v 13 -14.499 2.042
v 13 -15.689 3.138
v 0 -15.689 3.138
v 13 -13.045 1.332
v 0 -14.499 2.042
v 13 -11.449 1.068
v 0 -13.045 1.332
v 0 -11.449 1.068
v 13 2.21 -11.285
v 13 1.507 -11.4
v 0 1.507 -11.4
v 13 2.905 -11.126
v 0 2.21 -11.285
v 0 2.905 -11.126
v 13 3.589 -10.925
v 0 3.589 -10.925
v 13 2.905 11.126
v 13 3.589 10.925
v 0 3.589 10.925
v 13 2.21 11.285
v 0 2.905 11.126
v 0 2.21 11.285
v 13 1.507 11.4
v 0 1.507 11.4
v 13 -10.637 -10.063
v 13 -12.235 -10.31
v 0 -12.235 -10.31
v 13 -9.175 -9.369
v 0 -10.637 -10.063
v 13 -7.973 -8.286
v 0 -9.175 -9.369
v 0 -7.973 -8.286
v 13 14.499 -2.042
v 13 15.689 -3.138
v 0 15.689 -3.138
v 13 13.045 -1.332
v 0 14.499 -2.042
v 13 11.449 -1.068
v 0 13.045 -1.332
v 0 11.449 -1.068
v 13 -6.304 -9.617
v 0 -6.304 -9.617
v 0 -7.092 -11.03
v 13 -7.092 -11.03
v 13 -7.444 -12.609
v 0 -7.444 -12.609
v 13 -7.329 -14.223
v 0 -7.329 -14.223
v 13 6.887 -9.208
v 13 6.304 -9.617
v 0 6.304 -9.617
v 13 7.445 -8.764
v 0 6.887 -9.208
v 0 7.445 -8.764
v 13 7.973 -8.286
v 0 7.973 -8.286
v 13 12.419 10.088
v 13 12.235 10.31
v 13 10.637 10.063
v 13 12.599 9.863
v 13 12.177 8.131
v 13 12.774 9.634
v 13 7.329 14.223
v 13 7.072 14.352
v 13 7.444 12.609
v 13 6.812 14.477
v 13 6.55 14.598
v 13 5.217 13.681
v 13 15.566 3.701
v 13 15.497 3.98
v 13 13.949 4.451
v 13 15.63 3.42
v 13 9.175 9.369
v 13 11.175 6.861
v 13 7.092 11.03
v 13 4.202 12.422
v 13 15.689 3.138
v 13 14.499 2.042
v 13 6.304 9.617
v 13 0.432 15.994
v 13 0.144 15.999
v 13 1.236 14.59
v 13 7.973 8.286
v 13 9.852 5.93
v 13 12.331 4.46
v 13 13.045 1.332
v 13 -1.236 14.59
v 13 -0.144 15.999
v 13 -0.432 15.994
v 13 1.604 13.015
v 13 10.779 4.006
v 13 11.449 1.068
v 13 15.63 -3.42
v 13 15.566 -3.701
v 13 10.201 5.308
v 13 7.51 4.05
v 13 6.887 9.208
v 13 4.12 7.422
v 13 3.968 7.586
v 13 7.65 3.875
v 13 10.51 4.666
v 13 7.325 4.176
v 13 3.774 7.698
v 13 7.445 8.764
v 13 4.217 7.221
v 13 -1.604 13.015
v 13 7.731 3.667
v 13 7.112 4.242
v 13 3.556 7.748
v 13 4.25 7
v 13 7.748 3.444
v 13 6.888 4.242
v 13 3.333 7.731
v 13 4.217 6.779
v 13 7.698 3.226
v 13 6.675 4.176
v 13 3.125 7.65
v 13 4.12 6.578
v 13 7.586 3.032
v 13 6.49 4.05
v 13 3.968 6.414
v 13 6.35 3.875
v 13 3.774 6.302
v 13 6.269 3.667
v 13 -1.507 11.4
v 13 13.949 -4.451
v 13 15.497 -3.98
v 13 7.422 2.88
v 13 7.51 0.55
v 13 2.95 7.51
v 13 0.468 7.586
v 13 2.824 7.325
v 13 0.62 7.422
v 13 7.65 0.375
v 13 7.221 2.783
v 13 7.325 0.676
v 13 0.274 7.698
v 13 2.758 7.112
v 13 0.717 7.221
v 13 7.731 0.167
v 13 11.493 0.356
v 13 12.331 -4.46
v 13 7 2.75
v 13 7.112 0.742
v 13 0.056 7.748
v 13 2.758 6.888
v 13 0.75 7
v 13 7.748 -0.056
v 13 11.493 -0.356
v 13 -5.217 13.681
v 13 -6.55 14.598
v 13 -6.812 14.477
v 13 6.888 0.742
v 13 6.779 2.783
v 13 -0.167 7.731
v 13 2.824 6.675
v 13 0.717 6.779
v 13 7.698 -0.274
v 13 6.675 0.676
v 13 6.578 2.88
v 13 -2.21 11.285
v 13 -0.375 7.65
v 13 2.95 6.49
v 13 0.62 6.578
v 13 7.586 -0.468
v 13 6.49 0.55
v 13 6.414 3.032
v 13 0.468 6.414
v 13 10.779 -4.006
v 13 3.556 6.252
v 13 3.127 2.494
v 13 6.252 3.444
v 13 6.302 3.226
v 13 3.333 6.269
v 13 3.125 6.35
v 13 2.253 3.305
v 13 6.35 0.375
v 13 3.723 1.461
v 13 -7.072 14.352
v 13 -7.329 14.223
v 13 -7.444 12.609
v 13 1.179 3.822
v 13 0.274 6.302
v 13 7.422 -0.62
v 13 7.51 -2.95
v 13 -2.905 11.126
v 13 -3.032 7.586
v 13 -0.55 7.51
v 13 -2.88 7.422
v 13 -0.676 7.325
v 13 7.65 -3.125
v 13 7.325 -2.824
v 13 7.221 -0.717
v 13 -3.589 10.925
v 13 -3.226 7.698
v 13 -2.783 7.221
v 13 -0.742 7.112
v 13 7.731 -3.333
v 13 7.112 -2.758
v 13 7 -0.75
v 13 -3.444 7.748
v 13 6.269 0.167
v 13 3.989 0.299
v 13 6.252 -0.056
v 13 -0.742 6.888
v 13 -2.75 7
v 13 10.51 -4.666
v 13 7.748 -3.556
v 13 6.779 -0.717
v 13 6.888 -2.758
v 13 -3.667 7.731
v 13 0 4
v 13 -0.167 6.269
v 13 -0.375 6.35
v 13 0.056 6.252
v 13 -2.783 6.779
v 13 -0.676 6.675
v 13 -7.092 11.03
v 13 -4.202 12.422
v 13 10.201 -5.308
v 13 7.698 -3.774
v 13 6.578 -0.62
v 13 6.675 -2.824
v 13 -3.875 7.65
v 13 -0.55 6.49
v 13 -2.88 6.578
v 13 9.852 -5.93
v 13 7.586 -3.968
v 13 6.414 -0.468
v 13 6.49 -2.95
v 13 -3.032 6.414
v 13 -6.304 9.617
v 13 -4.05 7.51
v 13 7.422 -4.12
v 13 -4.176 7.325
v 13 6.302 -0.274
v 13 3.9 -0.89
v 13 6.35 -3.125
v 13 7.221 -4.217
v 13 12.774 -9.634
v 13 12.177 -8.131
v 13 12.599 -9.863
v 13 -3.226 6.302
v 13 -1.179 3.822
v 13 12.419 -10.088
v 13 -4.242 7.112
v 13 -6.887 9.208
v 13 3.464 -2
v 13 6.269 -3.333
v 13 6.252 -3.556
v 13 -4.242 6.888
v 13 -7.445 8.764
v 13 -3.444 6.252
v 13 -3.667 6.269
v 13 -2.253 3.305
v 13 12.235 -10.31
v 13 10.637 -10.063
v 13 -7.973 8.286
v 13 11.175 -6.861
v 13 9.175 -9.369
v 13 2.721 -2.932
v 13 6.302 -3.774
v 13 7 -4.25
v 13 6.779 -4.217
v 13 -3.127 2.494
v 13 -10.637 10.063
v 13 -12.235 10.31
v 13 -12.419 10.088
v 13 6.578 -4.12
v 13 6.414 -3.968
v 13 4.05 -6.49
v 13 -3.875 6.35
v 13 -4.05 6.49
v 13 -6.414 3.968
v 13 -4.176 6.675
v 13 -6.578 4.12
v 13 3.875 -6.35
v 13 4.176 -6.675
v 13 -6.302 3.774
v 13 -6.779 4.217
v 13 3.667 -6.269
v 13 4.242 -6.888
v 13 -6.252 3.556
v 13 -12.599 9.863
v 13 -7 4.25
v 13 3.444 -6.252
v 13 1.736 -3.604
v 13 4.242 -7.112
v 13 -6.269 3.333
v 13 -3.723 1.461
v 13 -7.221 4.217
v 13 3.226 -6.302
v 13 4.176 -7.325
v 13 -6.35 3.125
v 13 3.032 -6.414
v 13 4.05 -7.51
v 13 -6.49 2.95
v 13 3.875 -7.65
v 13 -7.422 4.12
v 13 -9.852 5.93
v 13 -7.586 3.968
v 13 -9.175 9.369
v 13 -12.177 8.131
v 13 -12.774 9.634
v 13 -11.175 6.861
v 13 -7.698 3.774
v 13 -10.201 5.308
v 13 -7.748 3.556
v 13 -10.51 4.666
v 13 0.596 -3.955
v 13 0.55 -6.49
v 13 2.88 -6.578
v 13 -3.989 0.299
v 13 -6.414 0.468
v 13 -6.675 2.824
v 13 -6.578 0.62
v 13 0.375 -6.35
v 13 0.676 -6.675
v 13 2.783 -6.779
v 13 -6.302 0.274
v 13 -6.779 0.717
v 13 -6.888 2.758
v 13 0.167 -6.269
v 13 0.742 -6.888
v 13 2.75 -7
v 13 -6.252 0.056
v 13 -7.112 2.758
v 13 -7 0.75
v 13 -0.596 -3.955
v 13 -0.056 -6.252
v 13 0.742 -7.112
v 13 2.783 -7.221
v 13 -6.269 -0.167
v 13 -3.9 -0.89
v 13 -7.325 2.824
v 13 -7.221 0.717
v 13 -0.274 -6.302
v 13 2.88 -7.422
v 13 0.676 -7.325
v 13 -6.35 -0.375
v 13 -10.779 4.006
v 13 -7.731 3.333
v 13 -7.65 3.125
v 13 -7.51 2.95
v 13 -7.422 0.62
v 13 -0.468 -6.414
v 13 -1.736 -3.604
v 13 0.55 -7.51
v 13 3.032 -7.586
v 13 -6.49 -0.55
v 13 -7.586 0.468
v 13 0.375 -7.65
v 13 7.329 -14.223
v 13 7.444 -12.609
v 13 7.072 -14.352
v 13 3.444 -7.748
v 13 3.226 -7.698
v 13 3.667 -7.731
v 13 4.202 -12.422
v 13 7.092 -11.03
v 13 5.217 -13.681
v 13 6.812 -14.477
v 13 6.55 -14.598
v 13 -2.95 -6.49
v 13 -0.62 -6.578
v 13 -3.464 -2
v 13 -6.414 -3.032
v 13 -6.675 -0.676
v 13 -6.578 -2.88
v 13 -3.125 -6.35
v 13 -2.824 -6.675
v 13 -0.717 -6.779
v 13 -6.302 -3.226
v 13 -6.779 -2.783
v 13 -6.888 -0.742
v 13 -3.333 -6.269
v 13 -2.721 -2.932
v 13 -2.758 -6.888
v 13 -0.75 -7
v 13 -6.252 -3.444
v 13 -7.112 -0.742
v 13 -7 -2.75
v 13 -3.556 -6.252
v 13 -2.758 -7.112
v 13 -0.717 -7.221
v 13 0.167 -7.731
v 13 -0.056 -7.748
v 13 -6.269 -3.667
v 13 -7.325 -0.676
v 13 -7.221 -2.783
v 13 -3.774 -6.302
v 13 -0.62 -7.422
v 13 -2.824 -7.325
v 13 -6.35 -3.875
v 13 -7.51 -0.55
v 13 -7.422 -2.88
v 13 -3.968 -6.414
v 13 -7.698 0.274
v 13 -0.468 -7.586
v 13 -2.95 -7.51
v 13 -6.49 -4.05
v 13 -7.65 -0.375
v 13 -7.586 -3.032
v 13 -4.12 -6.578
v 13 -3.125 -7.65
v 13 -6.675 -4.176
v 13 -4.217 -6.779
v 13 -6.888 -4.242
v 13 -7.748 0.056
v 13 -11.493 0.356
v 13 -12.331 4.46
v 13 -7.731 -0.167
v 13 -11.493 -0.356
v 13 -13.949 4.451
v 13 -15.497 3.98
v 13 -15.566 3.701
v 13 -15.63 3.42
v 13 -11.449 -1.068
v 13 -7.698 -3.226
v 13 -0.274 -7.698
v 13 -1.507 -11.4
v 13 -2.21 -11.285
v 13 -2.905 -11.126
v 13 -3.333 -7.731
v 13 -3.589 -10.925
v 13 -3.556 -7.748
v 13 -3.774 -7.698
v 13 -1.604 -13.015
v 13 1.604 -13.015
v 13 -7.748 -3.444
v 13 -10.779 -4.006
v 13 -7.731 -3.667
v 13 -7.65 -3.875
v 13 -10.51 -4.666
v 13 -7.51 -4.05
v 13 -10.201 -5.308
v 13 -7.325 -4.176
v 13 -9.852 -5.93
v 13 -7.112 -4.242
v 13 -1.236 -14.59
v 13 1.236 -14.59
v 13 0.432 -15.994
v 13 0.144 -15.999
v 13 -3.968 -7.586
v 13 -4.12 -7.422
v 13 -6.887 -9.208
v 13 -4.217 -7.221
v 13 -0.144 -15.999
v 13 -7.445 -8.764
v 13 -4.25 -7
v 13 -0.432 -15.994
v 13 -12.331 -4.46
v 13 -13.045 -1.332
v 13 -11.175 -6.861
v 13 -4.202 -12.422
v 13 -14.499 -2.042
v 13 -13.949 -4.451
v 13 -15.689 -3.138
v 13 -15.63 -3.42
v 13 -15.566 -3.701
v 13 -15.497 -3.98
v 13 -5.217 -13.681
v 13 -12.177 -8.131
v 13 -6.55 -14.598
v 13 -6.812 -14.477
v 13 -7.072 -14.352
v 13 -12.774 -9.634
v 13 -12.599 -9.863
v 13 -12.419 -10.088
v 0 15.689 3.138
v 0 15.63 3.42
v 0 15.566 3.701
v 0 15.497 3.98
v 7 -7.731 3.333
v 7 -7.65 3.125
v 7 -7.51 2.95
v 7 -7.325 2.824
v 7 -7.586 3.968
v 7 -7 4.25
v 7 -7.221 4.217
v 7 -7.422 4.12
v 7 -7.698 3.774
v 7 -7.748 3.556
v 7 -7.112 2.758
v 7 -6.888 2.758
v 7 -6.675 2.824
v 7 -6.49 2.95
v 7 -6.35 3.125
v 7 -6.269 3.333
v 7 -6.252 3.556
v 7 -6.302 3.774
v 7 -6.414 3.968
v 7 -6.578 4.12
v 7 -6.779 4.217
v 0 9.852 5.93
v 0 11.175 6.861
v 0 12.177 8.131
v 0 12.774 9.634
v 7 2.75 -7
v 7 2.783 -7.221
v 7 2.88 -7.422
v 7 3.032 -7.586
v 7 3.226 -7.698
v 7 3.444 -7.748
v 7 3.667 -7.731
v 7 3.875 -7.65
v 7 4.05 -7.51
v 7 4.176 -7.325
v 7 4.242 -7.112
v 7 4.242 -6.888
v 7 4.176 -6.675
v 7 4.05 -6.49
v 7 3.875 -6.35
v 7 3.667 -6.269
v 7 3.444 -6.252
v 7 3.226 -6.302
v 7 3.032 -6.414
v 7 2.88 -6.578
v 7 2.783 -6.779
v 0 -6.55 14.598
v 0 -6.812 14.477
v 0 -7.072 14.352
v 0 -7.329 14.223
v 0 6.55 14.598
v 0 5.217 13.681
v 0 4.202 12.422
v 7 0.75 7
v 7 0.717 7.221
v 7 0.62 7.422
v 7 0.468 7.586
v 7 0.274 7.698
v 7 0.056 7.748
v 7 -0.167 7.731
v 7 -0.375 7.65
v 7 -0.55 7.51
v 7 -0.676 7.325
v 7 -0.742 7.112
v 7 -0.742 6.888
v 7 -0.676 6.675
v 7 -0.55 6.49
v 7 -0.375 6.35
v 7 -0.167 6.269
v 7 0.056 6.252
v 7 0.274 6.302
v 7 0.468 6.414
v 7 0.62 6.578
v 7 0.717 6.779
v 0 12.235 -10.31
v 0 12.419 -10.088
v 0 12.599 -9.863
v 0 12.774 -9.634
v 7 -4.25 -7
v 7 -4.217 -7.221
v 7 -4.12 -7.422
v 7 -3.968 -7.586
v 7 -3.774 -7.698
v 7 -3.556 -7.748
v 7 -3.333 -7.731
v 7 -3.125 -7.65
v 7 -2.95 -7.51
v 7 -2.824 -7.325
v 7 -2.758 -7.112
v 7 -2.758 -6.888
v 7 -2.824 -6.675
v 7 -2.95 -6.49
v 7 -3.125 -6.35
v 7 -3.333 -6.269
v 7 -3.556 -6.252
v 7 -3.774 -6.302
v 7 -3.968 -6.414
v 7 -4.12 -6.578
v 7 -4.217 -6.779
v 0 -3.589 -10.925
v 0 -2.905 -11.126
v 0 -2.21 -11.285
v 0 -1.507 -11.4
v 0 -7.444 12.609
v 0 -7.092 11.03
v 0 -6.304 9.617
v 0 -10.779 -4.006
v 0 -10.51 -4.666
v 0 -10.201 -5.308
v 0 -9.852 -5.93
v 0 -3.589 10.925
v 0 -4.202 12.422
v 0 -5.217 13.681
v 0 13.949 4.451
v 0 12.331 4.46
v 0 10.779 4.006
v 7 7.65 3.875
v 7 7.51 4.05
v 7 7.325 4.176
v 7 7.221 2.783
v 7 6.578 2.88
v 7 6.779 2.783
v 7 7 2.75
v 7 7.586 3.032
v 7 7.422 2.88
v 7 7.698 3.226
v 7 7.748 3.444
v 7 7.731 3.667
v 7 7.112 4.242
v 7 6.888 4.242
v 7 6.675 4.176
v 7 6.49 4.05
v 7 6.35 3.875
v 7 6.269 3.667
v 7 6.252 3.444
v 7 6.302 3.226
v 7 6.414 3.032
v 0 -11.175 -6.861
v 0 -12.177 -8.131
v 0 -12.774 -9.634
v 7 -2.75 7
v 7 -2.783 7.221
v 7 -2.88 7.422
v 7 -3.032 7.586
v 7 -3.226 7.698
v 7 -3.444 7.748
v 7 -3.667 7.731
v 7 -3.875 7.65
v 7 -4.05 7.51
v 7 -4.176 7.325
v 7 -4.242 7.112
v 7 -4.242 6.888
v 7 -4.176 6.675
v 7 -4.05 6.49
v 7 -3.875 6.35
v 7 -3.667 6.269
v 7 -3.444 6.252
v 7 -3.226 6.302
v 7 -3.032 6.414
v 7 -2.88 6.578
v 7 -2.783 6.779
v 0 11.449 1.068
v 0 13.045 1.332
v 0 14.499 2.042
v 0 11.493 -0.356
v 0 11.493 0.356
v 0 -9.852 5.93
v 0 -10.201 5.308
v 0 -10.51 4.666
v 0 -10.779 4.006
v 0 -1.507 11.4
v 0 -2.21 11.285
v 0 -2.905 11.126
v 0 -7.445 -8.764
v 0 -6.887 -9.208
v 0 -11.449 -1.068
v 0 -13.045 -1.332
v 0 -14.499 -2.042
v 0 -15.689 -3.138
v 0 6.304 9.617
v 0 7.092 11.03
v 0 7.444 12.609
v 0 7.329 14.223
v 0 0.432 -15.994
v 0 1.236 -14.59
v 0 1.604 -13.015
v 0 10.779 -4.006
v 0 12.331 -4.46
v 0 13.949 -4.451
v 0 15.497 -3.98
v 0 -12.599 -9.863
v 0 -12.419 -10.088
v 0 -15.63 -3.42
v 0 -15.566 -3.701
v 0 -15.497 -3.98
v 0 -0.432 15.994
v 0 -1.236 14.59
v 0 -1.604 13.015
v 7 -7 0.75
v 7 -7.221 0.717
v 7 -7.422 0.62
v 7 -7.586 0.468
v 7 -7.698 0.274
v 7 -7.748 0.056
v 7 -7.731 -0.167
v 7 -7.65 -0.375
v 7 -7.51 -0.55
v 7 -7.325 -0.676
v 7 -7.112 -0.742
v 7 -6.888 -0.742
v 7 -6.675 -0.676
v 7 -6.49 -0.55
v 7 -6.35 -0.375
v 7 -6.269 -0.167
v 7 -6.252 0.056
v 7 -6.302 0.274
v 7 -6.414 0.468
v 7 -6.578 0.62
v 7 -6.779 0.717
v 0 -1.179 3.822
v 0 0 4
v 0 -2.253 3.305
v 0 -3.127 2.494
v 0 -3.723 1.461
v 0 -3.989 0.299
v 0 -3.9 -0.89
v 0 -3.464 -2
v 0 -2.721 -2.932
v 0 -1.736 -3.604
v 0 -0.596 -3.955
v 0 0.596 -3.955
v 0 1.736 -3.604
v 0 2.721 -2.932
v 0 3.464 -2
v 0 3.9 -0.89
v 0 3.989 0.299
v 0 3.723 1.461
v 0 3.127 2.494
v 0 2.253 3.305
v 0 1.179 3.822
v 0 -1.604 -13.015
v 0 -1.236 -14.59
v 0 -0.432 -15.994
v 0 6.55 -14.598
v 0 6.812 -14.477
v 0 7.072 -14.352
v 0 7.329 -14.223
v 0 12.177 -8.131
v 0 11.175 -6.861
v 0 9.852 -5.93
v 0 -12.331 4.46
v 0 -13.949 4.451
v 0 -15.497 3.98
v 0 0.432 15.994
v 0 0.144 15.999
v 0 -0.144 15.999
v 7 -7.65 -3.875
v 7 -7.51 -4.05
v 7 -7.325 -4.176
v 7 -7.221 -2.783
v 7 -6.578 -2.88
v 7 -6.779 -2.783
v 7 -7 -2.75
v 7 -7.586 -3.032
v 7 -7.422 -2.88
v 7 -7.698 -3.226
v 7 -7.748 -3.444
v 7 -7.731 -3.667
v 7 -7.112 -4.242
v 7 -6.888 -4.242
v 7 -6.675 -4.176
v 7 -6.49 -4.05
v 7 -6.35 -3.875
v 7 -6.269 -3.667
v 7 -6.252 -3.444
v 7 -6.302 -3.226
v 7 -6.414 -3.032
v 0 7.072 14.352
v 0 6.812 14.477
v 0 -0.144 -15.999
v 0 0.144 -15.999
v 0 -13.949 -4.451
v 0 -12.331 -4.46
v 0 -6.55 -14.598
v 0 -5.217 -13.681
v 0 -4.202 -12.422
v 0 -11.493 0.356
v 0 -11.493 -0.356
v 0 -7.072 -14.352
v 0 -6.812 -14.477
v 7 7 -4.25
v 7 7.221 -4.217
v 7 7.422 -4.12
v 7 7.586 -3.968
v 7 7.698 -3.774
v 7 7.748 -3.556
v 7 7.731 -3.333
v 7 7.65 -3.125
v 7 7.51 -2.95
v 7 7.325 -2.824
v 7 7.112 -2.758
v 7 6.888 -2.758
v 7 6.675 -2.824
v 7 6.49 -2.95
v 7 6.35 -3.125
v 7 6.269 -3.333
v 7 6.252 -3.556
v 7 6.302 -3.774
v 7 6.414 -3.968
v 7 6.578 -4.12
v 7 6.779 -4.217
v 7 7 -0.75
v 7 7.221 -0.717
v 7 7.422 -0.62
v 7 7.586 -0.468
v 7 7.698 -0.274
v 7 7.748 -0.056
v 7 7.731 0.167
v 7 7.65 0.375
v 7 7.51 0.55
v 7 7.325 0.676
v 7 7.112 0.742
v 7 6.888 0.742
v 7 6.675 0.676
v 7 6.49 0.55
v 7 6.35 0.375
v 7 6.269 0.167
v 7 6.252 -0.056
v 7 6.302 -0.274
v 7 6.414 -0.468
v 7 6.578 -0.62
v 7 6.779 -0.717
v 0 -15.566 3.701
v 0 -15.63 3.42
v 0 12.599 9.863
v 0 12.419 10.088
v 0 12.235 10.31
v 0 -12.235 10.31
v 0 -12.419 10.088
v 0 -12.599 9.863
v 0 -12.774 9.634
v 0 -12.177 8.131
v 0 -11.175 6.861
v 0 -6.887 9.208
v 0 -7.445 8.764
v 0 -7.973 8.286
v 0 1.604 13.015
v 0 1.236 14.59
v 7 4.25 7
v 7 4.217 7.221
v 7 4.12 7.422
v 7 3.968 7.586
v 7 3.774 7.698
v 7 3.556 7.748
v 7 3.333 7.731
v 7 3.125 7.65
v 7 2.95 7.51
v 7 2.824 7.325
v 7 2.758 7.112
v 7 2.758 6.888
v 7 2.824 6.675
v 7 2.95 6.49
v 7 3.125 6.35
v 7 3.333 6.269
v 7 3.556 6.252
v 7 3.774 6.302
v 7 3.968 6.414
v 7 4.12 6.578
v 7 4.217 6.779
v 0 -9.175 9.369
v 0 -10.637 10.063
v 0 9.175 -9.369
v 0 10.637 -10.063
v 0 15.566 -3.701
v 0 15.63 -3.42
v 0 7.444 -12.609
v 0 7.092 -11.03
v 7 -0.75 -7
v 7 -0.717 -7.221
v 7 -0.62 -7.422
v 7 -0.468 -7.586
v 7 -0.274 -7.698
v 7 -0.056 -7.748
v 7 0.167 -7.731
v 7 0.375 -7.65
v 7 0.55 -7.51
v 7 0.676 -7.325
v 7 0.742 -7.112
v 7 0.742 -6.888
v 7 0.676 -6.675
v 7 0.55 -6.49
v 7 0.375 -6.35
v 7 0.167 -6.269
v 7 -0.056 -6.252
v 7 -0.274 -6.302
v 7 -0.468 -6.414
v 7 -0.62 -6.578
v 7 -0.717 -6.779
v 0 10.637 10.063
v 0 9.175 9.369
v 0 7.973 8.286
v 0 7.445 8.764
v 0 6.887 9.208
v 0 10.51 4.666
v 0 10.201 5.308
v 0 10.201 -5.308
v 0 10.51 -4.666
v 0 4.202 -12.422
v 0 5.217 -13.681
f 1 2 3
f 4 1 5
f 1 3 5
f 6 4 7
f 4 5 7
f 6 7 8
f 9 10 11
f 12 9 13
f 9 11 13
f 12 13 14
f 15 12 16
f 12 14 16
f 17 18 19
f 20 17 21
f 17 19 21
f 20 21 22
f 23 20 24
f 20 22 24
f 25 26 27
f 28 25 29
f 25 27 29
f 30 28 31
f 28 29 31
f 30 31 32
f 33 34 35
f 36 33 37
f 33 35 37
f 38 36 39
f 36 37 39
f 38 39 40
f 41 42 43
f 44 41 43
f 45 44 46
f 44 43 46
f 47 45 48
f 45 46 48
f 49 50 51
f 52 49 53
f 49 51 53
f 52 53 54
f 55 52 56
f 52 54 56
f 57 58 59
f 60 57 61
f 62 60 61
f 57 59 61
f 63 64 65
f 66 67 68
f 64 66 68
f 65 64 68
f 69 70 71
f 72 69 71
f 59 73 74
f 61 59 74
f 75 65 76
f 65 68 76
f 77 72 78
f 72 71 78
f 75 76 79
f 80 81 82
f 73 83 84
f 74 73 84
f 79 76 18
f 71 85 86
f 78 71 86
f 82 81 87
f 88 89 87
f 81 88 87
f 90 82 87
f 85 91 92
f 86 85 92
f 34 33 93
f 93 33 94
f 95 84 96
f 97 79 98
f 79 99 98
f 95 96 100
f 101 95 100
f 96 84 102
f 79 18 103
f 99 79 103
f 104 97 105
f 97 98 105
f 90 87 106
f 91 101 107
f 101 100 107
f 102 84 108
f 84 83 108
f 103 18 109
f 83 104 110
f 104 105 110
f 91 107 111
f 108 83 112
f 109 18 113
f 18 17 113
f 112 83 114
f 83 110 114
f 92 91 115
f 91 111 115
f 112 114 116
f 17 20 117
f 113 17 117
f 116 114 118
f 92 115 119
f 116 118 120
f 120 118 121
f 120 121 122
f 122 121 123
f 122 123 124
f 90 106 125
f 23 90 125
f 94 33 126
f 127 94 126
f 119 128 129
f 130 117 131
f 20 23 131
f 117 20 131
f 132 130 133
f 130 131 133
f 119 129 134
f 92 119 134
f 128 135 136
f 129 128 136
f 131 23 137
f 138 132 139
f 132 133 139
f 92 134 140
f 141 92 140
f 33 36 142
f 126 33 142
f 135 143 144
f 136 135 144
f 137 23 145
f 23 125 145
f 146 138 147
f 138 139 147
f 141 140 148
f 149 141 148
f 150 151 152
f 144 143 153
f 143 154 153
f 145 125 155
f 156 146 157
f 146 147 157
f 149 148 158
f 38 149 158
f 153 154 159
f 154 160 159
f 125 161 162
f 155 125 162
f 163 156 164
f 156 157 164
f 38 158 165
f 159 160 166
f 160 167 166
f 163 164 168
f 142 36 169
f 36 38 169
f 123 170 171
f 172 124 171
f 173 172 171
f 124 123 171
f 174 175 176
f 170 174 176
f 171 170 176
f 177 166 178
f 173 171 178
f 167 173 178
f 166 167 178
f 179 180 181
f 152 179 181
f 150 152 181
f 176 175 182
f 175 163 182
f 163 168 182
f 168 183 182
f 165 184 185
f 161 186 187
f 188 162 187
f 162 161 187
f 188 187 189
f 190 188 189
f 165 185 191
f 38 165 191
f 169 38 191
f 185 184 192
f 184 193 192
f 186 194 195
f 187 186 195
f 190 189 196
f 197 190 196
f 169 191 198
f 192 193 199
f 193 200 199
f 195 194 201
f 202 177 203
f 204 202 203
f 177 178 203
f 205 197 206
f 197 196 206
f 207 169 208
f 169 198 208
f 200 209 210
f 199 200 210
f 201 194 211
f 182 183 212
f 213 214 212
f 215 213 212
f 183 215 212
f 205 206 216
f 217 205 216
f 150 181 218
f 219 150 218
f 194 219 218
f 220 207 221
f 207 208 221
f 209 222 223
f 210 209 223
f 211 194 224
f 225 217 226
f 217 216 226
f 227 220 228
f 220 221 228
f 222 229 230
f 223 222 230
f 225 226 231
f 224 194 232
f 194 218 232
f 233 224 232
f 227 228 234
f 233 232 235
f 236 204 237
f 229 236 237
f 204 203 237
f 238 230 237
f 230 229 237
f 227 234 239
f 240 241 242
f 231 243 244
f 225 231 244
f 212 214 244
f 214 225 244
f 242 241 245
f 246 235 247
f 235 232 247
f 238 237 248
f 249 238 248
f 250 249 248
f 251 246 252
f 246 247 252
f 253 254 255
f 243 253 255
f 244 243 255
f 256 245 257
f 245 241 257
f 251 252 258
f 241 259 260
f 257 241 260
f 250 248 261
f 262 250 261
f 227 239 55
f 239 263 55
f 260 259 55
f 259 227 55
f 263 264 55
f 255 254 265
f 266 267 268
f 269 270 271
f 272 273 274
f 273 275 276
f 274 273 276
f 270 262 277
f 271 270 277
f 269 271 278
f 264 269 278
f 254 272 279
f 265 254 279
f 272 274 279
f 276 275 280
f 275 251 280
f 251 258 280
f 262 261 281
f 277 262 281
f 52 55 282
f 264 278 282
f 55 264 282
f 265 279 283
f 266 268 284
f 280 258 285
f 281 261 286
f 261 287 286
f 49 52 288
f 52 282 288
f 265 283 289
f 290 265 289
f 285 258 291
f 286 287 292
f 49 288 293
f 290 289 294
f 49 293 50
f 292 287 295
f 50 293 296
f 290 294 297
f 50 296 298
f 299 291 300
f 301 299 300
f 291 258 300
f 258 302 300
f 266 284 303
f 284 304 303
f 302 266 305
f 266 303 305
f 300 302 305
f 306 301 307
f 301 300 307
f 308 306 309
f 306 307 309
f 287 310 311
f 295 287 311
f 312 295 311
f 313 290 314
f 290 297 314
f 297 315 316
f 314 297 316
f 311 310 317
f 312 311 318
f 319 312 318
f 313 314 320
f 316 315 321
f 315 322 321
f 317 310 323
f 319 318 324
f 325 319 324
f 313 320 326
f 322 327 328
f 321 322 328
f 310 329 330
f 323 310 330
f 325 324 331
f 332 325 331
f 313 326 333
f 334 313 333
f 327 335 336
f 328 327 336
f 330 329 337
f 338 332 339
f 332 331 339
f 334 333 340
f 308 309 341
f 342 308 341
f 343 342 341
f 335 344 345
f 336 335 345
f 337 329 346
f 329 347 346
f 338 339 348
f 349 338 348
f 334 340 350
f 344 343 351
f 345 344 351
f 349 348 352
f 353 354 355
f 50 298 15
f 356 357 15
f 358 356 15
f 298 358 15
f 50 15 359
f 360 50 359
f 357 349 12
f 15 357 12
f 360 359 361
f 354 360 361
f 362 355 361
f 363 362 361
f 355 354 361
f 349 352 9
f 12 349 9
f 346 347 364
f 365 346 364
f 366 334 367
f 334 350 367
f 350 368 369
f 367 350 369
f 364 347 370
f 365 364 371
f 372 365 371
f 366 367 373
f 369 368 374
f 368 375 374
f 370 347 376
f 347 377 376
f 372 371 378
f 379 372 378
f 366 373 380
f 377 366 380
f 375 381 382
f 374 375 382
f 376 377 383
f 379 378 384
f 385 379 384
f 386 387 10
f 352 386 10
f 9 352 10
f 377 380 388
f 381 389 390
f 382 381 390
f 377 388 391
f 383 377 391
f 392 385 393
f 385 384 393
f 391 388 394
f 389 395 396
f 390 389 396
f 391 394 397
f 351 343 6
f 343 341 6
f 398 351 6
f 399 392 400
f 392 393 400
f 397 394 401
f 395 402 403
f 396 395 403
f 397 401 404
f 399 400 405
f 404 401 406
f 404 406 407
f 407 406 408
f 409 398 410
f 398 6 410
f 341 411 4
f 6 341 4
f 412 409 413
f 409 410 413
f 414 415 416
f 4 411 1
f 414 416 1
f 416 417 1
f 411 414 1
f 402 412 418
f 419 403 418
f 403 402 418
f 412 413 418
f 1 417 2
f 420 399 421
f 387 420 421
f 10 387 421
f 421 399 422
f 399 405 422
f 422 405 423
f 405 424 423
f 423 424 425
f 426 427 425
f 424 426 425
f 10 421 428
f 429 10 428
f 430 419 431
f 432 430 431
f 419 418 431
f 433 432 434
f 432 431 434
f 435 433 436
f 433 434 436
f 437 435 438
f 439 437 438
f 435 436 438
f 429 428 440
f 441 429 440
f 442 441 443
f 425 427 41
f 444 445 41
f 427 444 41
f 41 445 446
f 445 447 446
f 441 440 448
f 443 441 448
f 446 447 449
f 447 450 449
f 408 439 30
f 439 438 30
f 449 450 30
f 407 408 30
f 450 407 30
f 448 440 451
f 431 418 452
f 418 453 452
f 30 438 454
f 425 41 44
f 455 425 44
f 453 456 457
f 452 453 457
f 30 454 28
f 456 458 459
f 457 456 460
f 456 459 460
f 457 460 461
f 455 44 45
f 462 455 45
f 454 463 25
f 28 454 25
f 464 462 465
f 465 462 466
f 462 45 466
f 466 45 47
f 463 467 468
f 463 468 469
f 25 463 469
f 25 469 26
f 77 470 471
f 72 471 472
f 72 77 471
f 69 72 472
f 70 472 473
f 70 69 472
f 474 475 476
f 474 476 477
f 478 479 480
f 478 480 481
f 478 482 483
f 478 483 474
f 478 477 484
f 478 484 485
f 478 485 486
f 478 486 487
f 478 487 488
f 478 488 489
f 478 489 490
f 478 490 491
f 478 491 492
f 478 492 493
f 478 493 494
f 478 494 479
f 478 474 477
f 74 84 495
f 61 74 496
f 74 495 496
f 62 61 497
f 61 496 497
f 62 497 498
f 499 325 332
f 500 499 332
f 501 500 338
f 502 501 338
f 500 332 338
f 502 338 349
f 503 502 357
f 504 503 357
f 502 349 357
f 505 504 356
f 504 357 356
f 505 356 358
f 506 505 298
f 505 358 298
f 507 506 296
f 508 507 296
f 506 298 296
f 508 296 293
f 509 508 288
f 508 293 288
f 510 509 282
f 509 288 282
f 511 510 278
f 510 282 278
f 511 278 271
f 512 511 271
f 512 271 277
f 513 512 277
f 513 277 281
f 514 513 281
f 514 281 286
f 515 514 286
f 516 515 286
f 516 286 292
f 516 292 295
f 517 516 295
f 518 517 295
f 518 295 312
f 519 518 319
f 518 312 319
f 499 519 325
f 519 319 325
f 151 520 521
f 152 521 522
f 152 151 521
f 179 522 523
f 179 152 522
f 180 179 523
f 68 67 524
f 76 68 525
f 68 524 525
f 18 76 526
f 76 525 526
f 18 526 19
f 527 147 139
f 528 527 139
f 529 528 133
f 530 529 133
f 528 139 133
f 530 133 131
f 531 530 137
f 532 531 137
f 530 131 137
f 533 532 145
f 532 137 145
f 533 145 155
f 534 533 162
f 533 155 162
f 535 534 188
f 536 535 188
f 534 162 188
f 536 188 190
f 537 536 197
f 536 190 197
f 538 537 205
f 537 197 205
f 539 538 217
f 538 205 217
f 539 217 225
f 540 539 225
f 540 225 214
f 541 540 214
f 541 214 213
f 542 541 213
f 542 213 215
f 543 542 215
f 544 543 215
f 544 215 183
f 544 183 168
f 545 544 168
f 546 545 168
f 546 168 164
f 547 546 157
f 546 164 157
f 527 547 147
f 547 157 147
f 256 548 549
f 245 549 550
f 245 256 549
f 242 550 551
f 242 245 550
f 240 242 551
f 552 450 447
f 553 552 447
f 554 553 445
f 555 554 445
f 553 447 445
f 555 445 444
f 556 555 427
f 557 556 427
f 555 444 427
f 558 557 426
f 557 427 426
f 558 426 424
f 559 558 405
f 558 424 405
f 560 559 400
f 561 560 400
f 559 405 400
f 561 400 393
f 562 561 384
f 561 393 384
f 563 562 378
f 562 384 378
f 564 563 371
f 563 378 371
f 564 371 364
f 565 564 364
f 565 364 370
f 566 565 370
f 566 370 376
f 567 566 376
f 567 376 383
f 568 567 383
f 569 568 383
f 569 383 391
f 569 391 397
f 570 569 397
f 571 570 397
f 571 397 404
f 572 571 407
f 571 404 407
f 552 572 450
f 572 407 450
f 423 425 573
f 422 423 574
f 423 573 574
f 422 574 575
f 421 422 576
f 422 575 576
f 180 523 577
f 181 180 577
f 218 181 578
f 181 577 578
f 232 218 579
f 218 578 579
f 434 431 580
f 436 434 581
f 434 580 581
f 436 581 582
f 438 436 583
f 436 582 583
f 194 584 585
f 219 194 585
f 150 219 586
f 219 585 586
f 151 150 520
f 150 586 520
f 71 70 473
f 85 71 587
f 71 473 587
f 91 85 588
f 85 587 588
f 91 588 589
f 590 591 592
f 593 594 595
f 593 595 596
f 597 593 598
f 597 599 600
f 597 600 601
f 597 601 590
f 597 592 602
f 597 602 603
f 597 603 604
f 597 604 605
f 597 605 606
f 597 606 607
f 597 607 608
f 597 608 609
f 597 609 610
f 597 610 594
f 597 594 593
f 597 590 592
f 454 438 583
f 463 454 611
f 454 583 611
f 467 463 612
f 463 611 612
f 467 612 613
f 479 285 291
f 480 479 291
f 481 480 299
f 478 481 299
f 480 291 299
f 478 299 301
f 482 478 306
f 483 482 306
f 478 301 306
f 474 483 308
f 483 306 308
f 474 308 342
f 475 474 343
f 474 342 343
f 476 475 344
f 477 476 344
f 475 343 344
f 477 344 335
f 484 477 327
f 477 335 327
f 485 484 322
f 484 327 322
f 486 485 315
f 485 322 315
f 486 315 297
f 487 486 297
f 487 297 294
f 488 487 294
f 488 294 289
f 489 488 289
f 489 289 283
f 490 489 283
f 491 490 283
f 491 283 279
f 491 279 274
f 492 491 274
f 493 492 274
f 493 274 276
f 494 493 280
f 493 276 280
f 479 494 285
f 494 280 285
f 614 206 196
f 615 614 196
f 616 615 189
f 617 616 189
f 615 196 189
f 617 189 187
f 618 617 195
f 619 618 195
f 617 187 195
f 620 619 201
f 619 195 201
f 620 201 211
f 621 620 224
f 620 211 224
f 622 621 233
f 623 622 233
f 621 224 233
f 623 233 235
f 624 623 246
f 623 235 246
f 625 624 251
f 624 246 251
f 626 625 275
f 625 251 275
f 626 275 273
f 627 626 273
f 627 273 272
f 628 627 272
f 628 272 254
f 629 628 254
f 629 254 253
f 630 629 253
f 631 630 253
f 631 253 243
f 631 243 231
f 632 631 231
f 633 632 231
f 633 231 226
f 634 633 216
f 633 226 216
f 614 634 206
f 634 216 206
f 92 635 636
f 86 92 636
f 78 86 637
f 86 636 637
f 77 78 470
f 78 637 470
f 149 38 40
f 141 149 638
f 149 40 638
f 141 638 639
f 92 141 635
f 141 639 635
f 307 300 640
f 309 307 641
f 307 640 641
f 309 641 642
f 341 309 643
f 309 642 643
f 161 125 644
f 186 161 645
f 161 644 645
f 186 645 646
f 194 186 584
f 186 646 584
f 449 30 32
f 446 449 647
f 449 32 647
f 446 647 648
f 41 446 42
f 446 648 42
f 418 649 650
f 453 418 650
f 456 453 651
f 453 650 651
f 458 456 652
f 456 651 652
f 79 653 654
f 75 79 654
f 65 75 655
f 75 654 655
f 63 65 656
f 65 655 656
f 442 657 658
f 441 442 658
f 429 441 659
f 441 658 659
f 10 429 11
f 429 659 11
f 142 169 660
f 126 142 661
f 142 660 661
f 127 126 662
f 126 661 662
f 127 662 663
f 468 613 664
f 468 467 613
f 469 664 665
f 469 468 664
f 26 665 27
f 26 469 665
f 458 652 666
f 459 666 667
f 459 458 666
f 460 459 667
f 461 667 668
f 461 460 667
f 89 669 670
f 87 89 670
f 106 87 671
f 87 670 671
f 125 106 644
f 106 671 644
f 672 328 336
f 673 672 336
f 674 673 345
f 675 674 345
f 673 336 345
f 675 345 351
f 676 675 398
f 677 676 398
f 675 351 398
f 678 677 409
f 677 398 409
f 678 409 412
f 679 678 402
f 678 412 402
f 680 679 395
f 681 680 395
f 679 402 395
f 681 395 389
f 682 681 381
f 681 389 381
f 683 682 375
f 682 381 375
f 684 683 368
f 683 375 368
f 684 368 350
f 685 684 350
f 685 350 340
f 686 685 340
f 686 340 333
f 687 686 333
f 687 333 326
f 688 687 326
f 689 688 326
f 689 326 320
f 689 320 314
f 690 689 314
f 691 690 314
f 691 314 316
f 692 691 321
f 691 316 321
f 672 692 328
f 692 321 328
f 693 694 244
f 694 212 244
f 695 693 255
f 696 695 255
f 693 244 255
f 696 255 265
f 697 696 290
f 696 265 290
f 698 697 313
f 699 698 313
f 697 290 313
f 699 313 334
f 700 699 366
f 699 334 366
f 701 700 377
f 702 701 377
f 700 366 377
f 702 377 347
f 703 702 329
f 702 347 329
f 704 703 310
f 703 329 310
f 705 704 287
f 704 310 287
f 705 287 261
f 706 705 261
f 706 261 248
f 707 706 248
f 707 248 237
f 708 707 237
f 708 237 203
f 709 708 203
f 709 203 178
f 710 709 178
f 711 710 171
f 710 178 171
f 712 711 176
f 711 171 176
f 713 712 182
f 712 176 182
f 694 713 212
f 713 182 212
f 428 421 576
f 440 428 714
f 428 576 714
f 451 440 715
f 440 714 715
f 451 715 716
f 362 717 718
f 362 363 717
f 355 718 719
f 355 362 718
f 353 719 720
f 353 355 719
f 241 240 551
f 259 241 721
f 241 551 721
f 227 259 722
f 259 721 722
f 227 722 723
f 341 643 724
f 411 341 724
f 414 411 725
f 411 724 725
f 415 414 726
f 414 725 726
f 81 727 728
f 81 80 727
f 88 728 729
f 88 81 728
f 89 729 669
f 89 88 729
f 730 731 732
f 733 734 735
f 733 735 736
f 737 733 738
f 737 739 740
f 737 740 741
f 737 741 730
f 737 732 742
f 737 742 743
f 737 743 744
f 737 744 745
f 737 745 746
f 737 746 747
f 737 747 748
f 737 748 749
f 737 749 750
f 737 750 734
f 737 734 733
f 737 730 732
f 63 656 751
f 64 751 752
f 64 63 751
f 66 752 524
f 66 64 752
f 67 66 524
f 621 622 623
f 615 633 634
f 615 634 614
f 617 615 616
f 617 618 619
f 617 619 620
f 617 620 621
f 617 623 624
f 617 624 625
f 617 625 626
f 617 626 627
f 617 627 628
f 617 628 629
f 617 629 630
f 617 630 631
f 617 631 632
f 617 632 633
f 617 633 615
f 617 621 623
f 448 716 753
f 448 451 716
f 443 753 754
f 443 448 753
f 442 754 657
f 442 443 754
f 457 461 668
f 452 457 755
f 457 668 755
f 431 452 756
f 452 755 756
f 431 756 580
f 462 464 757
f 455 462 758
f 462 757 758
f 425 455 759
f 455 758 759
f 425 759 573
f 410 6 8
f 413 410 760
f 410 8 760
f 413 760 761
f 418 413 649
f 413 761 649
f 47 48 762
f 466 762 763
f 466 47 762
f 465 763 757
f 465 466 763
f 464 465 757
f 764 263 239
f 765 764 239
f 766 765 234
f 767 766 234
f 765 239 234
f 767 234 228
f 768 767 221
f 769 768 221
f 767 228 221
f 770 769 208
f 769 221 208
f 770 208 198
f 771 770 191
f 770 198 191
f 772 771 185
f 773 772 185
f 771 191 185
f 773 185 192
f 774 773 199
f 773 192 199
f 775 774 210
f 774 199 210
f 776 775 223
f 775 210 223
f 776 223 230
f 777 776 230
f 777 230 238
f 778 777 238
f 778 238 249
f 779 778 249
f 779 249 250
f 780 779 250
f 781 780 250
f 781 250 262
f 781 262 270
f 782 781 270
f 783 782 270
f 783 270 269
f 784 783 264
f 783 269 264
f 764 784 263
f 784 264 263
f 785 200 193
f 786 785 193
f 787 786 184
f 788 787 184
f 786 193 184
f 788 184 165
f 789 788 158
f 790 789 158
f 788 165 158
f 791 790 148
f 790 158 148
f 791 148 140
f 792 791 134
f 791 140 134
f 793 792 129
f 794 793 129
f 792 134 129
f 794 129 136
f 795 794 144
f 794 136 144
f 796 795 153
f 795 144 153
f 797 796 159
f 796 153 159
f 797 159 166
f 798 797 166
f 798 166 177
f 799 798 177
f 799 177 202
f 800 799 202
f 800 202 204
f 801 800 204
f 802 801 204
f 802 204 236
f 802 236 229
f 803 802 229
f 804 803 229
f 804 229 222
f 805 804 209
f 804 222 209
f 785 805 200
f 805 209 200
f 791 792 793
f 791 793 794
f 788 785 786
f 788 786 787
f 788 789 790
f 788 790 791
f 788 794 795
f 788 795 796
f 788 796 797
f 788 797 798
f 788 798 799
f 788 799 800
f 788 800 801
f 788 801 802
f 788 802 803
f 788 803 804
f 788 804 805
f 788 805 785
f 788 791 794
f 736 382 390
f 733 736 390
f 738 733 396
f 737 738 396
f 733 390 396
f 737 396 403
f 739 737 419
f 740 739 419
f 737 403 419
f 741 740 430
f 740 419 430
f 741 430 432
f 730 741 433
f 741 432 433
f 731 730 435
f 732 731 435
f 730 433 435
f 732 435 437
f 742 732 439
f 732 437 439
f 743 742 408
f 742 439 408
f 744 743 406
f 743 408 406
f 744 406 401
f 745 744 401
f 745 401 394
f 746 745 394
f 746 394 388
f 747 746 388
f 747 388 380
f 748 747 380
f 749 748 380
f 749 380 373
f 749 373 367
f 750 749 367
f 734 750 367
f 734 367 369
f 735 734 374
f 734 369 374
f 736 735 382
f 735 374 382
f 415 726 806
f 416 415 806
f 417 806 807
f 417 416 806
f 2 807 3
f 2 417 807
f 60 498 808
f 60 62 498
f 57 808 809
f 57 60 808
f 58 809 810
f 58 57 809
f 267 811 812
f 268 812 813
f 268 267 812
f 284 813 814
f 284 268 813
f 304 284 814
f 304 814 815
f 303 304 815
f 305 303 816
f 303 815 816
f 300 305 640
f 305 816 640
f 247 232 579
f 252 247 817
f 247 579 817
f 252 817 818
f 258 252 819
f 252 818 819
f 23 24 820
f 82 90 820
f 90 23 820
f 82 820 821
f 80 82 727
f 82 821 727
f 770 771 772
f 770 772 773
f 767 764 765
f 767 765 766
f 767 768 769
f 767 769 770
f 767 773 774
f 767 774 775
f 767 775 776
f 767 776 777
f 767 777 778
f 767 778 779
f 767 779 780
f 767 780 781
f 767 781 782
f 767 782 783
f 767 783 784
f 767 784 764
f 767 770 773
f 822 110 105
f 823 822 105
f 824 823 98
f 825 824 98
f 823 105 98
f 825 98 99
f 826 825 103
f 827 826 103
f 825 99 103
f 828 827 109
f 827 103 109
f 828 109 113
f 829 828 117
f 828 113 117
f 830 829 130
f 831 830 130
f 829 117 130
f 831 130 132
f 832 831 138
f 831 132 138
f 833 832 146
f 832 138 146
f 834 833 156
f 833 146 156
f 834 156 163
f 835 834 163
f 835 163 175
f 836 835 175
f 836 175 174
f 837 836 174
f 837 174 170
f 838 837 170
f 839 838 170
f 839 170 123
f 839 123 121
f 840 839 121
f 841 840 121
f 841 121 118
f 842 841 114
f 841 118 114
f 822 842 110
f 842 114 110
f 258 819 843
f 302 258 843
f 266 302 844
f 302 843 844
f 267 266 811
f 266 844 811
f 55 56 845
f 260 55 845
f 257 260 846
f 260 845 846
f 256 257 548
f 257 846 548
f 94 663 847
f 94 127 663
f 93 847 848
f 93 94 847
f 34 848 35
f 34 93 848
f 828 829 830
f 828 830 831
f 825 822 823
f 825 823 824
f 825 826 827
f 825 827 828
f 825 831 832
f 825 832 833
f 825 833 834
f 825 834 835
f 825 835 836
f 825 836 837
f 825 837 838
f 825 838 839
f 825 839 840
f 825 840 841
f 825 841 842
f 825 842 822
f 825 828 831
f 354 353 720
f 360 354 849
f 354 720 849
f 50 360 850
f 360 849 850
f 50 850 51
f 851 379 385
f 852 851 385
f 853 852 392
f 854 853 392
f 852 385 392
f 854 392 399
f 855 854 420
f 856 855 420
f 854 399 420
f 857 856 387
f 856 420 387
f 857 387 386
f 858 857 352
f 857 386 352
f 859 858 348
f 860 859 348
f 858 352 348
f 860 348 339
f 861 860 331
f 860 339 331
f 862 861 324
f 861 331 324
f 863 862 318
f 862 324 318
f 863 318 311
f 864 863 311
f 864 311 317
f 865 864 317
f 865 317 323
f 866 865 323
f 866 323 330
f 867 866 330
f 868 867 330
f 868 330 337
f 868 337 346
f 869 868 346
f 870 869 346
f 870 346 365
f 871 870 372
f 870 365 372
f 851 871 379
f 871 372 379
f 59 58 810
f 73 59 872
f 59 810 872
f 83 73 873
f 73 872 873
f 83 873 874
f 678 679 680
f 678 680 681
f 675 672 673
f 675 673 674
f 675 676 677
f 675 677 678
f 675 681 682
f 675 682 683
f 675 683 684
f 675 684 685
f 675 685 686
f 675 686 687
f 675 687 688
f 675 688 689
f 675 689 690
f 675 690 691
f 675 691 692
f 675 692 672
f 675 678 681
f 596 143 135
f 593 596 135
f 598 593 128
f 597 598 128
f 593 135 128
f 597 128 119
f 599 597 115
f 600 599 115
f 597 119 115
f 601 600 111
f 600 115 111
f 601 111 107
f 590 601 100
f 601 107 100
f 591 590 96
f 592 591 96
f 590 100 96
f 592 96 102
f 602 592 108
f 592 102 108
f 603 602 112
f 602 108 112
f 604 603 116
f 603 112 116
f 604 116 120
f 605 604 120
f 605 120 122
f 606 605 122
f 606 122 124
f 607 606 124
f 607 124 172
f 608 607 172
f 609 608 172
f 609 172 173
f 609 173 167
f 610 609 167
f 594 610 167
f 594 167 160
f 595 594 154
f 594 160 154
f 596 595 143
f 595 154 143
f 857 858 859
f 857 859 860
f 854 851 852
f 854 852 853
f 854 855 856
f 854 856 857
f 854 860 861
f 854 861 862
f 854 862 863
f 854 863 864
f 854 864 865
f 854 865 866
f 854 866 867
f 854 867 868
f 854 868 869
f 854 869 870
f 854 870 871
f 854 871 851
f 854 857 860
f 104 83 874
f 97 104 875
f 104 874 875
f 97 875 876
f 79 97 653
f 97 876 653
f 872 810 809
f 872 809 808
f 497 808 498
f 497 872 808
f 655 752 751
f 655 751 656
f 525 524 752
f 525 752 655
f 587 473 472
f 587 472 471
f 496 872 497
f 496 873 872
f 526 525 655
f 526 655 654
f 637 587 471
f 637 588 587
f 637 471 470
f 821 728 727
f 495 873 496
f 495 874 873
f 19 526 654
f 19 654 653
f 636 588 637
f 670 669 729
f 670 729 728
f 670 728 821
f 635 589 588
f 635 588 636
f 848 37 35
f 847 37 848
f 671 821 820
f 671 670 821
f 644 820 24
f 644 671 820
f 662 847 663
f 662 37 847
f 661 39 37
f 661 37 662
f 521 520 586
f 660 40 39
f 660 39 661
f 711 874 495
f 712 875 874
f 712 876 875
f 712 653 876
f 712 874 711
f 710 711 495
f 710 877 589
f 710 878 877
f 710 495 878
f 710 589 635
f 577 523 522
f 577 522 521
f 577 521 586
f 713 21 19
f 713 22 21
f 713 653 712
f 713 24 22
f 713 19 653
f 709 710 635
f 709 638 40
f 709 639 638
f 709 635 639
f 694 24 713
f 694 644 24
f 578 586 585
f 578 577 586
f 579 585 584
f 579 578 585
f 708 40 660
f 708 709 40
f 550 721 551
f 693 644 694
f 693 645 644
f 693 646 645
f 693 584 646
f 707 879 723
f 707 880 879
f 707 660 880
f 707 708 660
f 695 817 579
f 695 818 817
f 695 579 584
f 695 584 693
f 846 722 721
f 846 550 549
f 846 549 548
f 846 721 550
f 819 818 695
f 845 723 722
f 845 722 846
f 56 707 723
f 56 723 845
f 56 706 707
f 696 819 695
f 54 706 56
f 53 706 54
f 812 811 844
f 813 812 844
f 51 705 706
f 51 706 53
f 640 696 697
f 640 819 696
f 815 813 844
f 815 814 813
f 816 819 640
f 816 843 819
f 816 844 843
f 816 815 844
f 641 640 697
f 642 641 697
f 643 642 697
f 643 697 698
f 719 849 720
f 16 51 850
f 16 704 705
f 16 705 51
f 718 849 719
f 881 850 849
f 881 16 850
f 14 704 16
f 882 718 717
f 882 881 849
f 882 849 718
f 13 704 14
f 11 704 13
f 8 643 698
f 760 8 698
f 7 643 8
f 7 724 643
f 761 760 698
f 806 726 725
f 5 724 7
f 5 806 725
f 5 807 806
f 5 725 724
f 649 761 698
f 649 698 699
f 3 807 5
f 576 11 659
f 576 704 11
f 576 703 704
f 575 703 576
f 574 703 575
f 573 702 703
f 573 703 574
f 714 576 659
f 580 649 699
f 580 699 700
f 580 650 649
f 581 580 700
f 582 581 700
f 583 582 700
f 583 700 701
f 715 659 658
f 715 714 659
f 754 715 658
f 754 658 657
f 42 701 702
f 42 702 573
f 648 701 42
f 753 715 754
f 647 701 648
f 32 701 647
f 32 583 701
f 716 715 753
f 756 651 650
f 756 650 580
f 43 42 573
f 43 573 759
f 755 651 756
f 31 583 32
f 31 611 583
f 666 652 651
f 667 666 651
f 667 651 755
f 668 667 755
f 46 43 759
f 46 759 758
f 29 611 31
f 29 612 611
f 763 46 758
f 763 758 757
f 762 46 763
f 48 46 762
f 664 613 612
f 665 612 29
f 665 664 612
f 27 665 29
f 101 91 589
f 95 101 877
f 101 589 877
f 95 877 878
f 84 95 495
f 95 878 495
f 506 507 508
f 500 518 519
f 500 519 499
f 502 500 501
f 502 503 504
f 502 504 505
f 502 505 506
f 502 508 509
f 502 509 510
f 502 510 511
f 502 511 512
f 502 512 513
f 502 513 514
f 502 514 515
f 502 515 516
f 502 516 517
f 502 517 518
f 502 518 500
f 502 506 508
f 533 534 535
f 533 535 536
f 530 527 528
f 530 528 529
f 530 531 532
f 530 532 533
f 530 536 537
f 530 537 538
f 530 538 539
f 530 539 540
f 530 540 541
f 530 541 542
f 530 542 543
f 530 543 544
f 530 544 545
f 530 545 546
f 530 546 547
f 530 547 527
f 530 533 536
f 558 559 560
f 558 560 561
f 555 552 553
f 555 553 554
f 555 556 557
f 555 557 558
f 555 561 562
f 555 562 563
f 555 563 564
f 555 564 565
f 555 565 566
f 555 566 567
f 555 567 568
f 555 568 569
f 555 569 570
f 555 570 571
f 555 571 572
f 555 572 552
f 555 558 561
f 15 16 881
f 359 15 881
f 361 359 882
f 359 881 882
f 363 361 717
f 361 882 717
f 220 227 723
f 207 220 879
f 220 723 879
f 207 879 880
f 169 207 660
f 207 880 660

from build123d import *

# Parameters (mm, degrees)
BASPROSKE_W        = 13
BASPROSKE_H        = 16
TOOTHCUT_DEPTH     = 27.095976701
TEETHCUTS_COUNT    = 14
TEETHCUTS_ANGLE    = 334.285714286
BORSKE_R           = 4
BORE_DEPTH         = 50.0005588
SKETCH2_R          = 0.75
CUT_EXTRUDE1_DEPTH = 6
CIRPATTERN1_COUNT  = 4


with BuildPart() as part:
    # BasProSke → Base-Revolve (revolve)
    with BuildSketch(Plane(origin=(0, 0, 0), x_dir=(1, 0, 0), z_dir=(0, 1, 0)), mode=Mode.PRIVATE) as base_revolve_sk:
        with Locations((6.5, 8)):
            Rectangle(BASPROSKE_W, BASPROSKE_H)
    revolve(base_revolve_sk.sketch.rotate(Axis((-10, 0, 0), (1, 0, 0)), 180), axis=Axis((-10, 0, 0), (1, 0, 0)))

    # TooCutSke → ToothCut (cut, through all)
    with BuildSketch(Plane(origin=(0, 0, 0), x_dir=(0, 0, -1), z_dir=(1, 0, 0))):
        with BuildLine():
            ThreePointArc((1.067858192, 11.449309144), (0, 11.499), (-1.067858192, 11.449309144))
            ThreePointArc((-1.067858192, 11.449309144), (-1.641684211, 13.812780716), (-3.163375005, 15.710076503))
            ThreePointArc((-3.163375005, 15.710076503), (0, 16.0254), (3.163375005, 15.710076503))
            ThreePointArc((3.163375005, 15.710076503), (1.641684211, 13.812780716), (1.067858192, 11.449309144))
        make_face()
    toothcut = extrude(amount=TOOTHCUT_DEPTH, mode=Mode.SUBTRACT)

    # TeethCuts: ToothCut ×14 about axis
    teethcuts_axis = Axis((-10, 0, 0), (1, 0, 0))
    for i in range(1, TEETHCUTS_COUNT):
        add(toothcut.rotate(teethcuts_axis, i * TEETHCUTS_ANGLE / (TEETHCUTS_COUNT - 1)), mode=Mode.SUBTRACT)

    # BorSke → Bore (cut, symmetric)
    with BuildSketch(Plane(origin=(0, 0, 0), x_dir=(0, 0, -1), z_dir=(1, 0, 0))):
        with Locations(Location((0, 0, 0), (0, 0, 180))):
            Circle(BORSKE_R)
    extrude(amount=BORE_DEPTH, both=True, mode=Mode.SUBTRACT)

    # Sketch2 → Cut-Extrude1 (cut)
    with BuildSketch(Plane(origin=(13, 0, 0), x_dir=(0, 0, -1), z_dir=(1, 0, 0))):
        with Locations((-3.5, 7)):
            Circle(SKETCH2_R)
        with Locations((0, 7)):
            Circle(SKETCH2_R)
        with Locations((3.5, 7)):
            Circle(SKETCH2_R)
    cut_extrude1 = extrude(amount=-CUT_EXTRUDE1_DEPTH, mode=Mode.SUBTRACT)

    # CirPattern1: Cut-Extrude1 ×4 about axis
    cirpattern1_axis = Axis((0, 0, 0), (1, 0, 0))
    for i in range(1, CIRPATTERN1_COUNT):
        add(cut_extrude1.rotate(cirpattern1_axis, i * 360 / CIRPATTERN1_COUNT), mode=Mode.SUBTRACT)


solid = part.part
